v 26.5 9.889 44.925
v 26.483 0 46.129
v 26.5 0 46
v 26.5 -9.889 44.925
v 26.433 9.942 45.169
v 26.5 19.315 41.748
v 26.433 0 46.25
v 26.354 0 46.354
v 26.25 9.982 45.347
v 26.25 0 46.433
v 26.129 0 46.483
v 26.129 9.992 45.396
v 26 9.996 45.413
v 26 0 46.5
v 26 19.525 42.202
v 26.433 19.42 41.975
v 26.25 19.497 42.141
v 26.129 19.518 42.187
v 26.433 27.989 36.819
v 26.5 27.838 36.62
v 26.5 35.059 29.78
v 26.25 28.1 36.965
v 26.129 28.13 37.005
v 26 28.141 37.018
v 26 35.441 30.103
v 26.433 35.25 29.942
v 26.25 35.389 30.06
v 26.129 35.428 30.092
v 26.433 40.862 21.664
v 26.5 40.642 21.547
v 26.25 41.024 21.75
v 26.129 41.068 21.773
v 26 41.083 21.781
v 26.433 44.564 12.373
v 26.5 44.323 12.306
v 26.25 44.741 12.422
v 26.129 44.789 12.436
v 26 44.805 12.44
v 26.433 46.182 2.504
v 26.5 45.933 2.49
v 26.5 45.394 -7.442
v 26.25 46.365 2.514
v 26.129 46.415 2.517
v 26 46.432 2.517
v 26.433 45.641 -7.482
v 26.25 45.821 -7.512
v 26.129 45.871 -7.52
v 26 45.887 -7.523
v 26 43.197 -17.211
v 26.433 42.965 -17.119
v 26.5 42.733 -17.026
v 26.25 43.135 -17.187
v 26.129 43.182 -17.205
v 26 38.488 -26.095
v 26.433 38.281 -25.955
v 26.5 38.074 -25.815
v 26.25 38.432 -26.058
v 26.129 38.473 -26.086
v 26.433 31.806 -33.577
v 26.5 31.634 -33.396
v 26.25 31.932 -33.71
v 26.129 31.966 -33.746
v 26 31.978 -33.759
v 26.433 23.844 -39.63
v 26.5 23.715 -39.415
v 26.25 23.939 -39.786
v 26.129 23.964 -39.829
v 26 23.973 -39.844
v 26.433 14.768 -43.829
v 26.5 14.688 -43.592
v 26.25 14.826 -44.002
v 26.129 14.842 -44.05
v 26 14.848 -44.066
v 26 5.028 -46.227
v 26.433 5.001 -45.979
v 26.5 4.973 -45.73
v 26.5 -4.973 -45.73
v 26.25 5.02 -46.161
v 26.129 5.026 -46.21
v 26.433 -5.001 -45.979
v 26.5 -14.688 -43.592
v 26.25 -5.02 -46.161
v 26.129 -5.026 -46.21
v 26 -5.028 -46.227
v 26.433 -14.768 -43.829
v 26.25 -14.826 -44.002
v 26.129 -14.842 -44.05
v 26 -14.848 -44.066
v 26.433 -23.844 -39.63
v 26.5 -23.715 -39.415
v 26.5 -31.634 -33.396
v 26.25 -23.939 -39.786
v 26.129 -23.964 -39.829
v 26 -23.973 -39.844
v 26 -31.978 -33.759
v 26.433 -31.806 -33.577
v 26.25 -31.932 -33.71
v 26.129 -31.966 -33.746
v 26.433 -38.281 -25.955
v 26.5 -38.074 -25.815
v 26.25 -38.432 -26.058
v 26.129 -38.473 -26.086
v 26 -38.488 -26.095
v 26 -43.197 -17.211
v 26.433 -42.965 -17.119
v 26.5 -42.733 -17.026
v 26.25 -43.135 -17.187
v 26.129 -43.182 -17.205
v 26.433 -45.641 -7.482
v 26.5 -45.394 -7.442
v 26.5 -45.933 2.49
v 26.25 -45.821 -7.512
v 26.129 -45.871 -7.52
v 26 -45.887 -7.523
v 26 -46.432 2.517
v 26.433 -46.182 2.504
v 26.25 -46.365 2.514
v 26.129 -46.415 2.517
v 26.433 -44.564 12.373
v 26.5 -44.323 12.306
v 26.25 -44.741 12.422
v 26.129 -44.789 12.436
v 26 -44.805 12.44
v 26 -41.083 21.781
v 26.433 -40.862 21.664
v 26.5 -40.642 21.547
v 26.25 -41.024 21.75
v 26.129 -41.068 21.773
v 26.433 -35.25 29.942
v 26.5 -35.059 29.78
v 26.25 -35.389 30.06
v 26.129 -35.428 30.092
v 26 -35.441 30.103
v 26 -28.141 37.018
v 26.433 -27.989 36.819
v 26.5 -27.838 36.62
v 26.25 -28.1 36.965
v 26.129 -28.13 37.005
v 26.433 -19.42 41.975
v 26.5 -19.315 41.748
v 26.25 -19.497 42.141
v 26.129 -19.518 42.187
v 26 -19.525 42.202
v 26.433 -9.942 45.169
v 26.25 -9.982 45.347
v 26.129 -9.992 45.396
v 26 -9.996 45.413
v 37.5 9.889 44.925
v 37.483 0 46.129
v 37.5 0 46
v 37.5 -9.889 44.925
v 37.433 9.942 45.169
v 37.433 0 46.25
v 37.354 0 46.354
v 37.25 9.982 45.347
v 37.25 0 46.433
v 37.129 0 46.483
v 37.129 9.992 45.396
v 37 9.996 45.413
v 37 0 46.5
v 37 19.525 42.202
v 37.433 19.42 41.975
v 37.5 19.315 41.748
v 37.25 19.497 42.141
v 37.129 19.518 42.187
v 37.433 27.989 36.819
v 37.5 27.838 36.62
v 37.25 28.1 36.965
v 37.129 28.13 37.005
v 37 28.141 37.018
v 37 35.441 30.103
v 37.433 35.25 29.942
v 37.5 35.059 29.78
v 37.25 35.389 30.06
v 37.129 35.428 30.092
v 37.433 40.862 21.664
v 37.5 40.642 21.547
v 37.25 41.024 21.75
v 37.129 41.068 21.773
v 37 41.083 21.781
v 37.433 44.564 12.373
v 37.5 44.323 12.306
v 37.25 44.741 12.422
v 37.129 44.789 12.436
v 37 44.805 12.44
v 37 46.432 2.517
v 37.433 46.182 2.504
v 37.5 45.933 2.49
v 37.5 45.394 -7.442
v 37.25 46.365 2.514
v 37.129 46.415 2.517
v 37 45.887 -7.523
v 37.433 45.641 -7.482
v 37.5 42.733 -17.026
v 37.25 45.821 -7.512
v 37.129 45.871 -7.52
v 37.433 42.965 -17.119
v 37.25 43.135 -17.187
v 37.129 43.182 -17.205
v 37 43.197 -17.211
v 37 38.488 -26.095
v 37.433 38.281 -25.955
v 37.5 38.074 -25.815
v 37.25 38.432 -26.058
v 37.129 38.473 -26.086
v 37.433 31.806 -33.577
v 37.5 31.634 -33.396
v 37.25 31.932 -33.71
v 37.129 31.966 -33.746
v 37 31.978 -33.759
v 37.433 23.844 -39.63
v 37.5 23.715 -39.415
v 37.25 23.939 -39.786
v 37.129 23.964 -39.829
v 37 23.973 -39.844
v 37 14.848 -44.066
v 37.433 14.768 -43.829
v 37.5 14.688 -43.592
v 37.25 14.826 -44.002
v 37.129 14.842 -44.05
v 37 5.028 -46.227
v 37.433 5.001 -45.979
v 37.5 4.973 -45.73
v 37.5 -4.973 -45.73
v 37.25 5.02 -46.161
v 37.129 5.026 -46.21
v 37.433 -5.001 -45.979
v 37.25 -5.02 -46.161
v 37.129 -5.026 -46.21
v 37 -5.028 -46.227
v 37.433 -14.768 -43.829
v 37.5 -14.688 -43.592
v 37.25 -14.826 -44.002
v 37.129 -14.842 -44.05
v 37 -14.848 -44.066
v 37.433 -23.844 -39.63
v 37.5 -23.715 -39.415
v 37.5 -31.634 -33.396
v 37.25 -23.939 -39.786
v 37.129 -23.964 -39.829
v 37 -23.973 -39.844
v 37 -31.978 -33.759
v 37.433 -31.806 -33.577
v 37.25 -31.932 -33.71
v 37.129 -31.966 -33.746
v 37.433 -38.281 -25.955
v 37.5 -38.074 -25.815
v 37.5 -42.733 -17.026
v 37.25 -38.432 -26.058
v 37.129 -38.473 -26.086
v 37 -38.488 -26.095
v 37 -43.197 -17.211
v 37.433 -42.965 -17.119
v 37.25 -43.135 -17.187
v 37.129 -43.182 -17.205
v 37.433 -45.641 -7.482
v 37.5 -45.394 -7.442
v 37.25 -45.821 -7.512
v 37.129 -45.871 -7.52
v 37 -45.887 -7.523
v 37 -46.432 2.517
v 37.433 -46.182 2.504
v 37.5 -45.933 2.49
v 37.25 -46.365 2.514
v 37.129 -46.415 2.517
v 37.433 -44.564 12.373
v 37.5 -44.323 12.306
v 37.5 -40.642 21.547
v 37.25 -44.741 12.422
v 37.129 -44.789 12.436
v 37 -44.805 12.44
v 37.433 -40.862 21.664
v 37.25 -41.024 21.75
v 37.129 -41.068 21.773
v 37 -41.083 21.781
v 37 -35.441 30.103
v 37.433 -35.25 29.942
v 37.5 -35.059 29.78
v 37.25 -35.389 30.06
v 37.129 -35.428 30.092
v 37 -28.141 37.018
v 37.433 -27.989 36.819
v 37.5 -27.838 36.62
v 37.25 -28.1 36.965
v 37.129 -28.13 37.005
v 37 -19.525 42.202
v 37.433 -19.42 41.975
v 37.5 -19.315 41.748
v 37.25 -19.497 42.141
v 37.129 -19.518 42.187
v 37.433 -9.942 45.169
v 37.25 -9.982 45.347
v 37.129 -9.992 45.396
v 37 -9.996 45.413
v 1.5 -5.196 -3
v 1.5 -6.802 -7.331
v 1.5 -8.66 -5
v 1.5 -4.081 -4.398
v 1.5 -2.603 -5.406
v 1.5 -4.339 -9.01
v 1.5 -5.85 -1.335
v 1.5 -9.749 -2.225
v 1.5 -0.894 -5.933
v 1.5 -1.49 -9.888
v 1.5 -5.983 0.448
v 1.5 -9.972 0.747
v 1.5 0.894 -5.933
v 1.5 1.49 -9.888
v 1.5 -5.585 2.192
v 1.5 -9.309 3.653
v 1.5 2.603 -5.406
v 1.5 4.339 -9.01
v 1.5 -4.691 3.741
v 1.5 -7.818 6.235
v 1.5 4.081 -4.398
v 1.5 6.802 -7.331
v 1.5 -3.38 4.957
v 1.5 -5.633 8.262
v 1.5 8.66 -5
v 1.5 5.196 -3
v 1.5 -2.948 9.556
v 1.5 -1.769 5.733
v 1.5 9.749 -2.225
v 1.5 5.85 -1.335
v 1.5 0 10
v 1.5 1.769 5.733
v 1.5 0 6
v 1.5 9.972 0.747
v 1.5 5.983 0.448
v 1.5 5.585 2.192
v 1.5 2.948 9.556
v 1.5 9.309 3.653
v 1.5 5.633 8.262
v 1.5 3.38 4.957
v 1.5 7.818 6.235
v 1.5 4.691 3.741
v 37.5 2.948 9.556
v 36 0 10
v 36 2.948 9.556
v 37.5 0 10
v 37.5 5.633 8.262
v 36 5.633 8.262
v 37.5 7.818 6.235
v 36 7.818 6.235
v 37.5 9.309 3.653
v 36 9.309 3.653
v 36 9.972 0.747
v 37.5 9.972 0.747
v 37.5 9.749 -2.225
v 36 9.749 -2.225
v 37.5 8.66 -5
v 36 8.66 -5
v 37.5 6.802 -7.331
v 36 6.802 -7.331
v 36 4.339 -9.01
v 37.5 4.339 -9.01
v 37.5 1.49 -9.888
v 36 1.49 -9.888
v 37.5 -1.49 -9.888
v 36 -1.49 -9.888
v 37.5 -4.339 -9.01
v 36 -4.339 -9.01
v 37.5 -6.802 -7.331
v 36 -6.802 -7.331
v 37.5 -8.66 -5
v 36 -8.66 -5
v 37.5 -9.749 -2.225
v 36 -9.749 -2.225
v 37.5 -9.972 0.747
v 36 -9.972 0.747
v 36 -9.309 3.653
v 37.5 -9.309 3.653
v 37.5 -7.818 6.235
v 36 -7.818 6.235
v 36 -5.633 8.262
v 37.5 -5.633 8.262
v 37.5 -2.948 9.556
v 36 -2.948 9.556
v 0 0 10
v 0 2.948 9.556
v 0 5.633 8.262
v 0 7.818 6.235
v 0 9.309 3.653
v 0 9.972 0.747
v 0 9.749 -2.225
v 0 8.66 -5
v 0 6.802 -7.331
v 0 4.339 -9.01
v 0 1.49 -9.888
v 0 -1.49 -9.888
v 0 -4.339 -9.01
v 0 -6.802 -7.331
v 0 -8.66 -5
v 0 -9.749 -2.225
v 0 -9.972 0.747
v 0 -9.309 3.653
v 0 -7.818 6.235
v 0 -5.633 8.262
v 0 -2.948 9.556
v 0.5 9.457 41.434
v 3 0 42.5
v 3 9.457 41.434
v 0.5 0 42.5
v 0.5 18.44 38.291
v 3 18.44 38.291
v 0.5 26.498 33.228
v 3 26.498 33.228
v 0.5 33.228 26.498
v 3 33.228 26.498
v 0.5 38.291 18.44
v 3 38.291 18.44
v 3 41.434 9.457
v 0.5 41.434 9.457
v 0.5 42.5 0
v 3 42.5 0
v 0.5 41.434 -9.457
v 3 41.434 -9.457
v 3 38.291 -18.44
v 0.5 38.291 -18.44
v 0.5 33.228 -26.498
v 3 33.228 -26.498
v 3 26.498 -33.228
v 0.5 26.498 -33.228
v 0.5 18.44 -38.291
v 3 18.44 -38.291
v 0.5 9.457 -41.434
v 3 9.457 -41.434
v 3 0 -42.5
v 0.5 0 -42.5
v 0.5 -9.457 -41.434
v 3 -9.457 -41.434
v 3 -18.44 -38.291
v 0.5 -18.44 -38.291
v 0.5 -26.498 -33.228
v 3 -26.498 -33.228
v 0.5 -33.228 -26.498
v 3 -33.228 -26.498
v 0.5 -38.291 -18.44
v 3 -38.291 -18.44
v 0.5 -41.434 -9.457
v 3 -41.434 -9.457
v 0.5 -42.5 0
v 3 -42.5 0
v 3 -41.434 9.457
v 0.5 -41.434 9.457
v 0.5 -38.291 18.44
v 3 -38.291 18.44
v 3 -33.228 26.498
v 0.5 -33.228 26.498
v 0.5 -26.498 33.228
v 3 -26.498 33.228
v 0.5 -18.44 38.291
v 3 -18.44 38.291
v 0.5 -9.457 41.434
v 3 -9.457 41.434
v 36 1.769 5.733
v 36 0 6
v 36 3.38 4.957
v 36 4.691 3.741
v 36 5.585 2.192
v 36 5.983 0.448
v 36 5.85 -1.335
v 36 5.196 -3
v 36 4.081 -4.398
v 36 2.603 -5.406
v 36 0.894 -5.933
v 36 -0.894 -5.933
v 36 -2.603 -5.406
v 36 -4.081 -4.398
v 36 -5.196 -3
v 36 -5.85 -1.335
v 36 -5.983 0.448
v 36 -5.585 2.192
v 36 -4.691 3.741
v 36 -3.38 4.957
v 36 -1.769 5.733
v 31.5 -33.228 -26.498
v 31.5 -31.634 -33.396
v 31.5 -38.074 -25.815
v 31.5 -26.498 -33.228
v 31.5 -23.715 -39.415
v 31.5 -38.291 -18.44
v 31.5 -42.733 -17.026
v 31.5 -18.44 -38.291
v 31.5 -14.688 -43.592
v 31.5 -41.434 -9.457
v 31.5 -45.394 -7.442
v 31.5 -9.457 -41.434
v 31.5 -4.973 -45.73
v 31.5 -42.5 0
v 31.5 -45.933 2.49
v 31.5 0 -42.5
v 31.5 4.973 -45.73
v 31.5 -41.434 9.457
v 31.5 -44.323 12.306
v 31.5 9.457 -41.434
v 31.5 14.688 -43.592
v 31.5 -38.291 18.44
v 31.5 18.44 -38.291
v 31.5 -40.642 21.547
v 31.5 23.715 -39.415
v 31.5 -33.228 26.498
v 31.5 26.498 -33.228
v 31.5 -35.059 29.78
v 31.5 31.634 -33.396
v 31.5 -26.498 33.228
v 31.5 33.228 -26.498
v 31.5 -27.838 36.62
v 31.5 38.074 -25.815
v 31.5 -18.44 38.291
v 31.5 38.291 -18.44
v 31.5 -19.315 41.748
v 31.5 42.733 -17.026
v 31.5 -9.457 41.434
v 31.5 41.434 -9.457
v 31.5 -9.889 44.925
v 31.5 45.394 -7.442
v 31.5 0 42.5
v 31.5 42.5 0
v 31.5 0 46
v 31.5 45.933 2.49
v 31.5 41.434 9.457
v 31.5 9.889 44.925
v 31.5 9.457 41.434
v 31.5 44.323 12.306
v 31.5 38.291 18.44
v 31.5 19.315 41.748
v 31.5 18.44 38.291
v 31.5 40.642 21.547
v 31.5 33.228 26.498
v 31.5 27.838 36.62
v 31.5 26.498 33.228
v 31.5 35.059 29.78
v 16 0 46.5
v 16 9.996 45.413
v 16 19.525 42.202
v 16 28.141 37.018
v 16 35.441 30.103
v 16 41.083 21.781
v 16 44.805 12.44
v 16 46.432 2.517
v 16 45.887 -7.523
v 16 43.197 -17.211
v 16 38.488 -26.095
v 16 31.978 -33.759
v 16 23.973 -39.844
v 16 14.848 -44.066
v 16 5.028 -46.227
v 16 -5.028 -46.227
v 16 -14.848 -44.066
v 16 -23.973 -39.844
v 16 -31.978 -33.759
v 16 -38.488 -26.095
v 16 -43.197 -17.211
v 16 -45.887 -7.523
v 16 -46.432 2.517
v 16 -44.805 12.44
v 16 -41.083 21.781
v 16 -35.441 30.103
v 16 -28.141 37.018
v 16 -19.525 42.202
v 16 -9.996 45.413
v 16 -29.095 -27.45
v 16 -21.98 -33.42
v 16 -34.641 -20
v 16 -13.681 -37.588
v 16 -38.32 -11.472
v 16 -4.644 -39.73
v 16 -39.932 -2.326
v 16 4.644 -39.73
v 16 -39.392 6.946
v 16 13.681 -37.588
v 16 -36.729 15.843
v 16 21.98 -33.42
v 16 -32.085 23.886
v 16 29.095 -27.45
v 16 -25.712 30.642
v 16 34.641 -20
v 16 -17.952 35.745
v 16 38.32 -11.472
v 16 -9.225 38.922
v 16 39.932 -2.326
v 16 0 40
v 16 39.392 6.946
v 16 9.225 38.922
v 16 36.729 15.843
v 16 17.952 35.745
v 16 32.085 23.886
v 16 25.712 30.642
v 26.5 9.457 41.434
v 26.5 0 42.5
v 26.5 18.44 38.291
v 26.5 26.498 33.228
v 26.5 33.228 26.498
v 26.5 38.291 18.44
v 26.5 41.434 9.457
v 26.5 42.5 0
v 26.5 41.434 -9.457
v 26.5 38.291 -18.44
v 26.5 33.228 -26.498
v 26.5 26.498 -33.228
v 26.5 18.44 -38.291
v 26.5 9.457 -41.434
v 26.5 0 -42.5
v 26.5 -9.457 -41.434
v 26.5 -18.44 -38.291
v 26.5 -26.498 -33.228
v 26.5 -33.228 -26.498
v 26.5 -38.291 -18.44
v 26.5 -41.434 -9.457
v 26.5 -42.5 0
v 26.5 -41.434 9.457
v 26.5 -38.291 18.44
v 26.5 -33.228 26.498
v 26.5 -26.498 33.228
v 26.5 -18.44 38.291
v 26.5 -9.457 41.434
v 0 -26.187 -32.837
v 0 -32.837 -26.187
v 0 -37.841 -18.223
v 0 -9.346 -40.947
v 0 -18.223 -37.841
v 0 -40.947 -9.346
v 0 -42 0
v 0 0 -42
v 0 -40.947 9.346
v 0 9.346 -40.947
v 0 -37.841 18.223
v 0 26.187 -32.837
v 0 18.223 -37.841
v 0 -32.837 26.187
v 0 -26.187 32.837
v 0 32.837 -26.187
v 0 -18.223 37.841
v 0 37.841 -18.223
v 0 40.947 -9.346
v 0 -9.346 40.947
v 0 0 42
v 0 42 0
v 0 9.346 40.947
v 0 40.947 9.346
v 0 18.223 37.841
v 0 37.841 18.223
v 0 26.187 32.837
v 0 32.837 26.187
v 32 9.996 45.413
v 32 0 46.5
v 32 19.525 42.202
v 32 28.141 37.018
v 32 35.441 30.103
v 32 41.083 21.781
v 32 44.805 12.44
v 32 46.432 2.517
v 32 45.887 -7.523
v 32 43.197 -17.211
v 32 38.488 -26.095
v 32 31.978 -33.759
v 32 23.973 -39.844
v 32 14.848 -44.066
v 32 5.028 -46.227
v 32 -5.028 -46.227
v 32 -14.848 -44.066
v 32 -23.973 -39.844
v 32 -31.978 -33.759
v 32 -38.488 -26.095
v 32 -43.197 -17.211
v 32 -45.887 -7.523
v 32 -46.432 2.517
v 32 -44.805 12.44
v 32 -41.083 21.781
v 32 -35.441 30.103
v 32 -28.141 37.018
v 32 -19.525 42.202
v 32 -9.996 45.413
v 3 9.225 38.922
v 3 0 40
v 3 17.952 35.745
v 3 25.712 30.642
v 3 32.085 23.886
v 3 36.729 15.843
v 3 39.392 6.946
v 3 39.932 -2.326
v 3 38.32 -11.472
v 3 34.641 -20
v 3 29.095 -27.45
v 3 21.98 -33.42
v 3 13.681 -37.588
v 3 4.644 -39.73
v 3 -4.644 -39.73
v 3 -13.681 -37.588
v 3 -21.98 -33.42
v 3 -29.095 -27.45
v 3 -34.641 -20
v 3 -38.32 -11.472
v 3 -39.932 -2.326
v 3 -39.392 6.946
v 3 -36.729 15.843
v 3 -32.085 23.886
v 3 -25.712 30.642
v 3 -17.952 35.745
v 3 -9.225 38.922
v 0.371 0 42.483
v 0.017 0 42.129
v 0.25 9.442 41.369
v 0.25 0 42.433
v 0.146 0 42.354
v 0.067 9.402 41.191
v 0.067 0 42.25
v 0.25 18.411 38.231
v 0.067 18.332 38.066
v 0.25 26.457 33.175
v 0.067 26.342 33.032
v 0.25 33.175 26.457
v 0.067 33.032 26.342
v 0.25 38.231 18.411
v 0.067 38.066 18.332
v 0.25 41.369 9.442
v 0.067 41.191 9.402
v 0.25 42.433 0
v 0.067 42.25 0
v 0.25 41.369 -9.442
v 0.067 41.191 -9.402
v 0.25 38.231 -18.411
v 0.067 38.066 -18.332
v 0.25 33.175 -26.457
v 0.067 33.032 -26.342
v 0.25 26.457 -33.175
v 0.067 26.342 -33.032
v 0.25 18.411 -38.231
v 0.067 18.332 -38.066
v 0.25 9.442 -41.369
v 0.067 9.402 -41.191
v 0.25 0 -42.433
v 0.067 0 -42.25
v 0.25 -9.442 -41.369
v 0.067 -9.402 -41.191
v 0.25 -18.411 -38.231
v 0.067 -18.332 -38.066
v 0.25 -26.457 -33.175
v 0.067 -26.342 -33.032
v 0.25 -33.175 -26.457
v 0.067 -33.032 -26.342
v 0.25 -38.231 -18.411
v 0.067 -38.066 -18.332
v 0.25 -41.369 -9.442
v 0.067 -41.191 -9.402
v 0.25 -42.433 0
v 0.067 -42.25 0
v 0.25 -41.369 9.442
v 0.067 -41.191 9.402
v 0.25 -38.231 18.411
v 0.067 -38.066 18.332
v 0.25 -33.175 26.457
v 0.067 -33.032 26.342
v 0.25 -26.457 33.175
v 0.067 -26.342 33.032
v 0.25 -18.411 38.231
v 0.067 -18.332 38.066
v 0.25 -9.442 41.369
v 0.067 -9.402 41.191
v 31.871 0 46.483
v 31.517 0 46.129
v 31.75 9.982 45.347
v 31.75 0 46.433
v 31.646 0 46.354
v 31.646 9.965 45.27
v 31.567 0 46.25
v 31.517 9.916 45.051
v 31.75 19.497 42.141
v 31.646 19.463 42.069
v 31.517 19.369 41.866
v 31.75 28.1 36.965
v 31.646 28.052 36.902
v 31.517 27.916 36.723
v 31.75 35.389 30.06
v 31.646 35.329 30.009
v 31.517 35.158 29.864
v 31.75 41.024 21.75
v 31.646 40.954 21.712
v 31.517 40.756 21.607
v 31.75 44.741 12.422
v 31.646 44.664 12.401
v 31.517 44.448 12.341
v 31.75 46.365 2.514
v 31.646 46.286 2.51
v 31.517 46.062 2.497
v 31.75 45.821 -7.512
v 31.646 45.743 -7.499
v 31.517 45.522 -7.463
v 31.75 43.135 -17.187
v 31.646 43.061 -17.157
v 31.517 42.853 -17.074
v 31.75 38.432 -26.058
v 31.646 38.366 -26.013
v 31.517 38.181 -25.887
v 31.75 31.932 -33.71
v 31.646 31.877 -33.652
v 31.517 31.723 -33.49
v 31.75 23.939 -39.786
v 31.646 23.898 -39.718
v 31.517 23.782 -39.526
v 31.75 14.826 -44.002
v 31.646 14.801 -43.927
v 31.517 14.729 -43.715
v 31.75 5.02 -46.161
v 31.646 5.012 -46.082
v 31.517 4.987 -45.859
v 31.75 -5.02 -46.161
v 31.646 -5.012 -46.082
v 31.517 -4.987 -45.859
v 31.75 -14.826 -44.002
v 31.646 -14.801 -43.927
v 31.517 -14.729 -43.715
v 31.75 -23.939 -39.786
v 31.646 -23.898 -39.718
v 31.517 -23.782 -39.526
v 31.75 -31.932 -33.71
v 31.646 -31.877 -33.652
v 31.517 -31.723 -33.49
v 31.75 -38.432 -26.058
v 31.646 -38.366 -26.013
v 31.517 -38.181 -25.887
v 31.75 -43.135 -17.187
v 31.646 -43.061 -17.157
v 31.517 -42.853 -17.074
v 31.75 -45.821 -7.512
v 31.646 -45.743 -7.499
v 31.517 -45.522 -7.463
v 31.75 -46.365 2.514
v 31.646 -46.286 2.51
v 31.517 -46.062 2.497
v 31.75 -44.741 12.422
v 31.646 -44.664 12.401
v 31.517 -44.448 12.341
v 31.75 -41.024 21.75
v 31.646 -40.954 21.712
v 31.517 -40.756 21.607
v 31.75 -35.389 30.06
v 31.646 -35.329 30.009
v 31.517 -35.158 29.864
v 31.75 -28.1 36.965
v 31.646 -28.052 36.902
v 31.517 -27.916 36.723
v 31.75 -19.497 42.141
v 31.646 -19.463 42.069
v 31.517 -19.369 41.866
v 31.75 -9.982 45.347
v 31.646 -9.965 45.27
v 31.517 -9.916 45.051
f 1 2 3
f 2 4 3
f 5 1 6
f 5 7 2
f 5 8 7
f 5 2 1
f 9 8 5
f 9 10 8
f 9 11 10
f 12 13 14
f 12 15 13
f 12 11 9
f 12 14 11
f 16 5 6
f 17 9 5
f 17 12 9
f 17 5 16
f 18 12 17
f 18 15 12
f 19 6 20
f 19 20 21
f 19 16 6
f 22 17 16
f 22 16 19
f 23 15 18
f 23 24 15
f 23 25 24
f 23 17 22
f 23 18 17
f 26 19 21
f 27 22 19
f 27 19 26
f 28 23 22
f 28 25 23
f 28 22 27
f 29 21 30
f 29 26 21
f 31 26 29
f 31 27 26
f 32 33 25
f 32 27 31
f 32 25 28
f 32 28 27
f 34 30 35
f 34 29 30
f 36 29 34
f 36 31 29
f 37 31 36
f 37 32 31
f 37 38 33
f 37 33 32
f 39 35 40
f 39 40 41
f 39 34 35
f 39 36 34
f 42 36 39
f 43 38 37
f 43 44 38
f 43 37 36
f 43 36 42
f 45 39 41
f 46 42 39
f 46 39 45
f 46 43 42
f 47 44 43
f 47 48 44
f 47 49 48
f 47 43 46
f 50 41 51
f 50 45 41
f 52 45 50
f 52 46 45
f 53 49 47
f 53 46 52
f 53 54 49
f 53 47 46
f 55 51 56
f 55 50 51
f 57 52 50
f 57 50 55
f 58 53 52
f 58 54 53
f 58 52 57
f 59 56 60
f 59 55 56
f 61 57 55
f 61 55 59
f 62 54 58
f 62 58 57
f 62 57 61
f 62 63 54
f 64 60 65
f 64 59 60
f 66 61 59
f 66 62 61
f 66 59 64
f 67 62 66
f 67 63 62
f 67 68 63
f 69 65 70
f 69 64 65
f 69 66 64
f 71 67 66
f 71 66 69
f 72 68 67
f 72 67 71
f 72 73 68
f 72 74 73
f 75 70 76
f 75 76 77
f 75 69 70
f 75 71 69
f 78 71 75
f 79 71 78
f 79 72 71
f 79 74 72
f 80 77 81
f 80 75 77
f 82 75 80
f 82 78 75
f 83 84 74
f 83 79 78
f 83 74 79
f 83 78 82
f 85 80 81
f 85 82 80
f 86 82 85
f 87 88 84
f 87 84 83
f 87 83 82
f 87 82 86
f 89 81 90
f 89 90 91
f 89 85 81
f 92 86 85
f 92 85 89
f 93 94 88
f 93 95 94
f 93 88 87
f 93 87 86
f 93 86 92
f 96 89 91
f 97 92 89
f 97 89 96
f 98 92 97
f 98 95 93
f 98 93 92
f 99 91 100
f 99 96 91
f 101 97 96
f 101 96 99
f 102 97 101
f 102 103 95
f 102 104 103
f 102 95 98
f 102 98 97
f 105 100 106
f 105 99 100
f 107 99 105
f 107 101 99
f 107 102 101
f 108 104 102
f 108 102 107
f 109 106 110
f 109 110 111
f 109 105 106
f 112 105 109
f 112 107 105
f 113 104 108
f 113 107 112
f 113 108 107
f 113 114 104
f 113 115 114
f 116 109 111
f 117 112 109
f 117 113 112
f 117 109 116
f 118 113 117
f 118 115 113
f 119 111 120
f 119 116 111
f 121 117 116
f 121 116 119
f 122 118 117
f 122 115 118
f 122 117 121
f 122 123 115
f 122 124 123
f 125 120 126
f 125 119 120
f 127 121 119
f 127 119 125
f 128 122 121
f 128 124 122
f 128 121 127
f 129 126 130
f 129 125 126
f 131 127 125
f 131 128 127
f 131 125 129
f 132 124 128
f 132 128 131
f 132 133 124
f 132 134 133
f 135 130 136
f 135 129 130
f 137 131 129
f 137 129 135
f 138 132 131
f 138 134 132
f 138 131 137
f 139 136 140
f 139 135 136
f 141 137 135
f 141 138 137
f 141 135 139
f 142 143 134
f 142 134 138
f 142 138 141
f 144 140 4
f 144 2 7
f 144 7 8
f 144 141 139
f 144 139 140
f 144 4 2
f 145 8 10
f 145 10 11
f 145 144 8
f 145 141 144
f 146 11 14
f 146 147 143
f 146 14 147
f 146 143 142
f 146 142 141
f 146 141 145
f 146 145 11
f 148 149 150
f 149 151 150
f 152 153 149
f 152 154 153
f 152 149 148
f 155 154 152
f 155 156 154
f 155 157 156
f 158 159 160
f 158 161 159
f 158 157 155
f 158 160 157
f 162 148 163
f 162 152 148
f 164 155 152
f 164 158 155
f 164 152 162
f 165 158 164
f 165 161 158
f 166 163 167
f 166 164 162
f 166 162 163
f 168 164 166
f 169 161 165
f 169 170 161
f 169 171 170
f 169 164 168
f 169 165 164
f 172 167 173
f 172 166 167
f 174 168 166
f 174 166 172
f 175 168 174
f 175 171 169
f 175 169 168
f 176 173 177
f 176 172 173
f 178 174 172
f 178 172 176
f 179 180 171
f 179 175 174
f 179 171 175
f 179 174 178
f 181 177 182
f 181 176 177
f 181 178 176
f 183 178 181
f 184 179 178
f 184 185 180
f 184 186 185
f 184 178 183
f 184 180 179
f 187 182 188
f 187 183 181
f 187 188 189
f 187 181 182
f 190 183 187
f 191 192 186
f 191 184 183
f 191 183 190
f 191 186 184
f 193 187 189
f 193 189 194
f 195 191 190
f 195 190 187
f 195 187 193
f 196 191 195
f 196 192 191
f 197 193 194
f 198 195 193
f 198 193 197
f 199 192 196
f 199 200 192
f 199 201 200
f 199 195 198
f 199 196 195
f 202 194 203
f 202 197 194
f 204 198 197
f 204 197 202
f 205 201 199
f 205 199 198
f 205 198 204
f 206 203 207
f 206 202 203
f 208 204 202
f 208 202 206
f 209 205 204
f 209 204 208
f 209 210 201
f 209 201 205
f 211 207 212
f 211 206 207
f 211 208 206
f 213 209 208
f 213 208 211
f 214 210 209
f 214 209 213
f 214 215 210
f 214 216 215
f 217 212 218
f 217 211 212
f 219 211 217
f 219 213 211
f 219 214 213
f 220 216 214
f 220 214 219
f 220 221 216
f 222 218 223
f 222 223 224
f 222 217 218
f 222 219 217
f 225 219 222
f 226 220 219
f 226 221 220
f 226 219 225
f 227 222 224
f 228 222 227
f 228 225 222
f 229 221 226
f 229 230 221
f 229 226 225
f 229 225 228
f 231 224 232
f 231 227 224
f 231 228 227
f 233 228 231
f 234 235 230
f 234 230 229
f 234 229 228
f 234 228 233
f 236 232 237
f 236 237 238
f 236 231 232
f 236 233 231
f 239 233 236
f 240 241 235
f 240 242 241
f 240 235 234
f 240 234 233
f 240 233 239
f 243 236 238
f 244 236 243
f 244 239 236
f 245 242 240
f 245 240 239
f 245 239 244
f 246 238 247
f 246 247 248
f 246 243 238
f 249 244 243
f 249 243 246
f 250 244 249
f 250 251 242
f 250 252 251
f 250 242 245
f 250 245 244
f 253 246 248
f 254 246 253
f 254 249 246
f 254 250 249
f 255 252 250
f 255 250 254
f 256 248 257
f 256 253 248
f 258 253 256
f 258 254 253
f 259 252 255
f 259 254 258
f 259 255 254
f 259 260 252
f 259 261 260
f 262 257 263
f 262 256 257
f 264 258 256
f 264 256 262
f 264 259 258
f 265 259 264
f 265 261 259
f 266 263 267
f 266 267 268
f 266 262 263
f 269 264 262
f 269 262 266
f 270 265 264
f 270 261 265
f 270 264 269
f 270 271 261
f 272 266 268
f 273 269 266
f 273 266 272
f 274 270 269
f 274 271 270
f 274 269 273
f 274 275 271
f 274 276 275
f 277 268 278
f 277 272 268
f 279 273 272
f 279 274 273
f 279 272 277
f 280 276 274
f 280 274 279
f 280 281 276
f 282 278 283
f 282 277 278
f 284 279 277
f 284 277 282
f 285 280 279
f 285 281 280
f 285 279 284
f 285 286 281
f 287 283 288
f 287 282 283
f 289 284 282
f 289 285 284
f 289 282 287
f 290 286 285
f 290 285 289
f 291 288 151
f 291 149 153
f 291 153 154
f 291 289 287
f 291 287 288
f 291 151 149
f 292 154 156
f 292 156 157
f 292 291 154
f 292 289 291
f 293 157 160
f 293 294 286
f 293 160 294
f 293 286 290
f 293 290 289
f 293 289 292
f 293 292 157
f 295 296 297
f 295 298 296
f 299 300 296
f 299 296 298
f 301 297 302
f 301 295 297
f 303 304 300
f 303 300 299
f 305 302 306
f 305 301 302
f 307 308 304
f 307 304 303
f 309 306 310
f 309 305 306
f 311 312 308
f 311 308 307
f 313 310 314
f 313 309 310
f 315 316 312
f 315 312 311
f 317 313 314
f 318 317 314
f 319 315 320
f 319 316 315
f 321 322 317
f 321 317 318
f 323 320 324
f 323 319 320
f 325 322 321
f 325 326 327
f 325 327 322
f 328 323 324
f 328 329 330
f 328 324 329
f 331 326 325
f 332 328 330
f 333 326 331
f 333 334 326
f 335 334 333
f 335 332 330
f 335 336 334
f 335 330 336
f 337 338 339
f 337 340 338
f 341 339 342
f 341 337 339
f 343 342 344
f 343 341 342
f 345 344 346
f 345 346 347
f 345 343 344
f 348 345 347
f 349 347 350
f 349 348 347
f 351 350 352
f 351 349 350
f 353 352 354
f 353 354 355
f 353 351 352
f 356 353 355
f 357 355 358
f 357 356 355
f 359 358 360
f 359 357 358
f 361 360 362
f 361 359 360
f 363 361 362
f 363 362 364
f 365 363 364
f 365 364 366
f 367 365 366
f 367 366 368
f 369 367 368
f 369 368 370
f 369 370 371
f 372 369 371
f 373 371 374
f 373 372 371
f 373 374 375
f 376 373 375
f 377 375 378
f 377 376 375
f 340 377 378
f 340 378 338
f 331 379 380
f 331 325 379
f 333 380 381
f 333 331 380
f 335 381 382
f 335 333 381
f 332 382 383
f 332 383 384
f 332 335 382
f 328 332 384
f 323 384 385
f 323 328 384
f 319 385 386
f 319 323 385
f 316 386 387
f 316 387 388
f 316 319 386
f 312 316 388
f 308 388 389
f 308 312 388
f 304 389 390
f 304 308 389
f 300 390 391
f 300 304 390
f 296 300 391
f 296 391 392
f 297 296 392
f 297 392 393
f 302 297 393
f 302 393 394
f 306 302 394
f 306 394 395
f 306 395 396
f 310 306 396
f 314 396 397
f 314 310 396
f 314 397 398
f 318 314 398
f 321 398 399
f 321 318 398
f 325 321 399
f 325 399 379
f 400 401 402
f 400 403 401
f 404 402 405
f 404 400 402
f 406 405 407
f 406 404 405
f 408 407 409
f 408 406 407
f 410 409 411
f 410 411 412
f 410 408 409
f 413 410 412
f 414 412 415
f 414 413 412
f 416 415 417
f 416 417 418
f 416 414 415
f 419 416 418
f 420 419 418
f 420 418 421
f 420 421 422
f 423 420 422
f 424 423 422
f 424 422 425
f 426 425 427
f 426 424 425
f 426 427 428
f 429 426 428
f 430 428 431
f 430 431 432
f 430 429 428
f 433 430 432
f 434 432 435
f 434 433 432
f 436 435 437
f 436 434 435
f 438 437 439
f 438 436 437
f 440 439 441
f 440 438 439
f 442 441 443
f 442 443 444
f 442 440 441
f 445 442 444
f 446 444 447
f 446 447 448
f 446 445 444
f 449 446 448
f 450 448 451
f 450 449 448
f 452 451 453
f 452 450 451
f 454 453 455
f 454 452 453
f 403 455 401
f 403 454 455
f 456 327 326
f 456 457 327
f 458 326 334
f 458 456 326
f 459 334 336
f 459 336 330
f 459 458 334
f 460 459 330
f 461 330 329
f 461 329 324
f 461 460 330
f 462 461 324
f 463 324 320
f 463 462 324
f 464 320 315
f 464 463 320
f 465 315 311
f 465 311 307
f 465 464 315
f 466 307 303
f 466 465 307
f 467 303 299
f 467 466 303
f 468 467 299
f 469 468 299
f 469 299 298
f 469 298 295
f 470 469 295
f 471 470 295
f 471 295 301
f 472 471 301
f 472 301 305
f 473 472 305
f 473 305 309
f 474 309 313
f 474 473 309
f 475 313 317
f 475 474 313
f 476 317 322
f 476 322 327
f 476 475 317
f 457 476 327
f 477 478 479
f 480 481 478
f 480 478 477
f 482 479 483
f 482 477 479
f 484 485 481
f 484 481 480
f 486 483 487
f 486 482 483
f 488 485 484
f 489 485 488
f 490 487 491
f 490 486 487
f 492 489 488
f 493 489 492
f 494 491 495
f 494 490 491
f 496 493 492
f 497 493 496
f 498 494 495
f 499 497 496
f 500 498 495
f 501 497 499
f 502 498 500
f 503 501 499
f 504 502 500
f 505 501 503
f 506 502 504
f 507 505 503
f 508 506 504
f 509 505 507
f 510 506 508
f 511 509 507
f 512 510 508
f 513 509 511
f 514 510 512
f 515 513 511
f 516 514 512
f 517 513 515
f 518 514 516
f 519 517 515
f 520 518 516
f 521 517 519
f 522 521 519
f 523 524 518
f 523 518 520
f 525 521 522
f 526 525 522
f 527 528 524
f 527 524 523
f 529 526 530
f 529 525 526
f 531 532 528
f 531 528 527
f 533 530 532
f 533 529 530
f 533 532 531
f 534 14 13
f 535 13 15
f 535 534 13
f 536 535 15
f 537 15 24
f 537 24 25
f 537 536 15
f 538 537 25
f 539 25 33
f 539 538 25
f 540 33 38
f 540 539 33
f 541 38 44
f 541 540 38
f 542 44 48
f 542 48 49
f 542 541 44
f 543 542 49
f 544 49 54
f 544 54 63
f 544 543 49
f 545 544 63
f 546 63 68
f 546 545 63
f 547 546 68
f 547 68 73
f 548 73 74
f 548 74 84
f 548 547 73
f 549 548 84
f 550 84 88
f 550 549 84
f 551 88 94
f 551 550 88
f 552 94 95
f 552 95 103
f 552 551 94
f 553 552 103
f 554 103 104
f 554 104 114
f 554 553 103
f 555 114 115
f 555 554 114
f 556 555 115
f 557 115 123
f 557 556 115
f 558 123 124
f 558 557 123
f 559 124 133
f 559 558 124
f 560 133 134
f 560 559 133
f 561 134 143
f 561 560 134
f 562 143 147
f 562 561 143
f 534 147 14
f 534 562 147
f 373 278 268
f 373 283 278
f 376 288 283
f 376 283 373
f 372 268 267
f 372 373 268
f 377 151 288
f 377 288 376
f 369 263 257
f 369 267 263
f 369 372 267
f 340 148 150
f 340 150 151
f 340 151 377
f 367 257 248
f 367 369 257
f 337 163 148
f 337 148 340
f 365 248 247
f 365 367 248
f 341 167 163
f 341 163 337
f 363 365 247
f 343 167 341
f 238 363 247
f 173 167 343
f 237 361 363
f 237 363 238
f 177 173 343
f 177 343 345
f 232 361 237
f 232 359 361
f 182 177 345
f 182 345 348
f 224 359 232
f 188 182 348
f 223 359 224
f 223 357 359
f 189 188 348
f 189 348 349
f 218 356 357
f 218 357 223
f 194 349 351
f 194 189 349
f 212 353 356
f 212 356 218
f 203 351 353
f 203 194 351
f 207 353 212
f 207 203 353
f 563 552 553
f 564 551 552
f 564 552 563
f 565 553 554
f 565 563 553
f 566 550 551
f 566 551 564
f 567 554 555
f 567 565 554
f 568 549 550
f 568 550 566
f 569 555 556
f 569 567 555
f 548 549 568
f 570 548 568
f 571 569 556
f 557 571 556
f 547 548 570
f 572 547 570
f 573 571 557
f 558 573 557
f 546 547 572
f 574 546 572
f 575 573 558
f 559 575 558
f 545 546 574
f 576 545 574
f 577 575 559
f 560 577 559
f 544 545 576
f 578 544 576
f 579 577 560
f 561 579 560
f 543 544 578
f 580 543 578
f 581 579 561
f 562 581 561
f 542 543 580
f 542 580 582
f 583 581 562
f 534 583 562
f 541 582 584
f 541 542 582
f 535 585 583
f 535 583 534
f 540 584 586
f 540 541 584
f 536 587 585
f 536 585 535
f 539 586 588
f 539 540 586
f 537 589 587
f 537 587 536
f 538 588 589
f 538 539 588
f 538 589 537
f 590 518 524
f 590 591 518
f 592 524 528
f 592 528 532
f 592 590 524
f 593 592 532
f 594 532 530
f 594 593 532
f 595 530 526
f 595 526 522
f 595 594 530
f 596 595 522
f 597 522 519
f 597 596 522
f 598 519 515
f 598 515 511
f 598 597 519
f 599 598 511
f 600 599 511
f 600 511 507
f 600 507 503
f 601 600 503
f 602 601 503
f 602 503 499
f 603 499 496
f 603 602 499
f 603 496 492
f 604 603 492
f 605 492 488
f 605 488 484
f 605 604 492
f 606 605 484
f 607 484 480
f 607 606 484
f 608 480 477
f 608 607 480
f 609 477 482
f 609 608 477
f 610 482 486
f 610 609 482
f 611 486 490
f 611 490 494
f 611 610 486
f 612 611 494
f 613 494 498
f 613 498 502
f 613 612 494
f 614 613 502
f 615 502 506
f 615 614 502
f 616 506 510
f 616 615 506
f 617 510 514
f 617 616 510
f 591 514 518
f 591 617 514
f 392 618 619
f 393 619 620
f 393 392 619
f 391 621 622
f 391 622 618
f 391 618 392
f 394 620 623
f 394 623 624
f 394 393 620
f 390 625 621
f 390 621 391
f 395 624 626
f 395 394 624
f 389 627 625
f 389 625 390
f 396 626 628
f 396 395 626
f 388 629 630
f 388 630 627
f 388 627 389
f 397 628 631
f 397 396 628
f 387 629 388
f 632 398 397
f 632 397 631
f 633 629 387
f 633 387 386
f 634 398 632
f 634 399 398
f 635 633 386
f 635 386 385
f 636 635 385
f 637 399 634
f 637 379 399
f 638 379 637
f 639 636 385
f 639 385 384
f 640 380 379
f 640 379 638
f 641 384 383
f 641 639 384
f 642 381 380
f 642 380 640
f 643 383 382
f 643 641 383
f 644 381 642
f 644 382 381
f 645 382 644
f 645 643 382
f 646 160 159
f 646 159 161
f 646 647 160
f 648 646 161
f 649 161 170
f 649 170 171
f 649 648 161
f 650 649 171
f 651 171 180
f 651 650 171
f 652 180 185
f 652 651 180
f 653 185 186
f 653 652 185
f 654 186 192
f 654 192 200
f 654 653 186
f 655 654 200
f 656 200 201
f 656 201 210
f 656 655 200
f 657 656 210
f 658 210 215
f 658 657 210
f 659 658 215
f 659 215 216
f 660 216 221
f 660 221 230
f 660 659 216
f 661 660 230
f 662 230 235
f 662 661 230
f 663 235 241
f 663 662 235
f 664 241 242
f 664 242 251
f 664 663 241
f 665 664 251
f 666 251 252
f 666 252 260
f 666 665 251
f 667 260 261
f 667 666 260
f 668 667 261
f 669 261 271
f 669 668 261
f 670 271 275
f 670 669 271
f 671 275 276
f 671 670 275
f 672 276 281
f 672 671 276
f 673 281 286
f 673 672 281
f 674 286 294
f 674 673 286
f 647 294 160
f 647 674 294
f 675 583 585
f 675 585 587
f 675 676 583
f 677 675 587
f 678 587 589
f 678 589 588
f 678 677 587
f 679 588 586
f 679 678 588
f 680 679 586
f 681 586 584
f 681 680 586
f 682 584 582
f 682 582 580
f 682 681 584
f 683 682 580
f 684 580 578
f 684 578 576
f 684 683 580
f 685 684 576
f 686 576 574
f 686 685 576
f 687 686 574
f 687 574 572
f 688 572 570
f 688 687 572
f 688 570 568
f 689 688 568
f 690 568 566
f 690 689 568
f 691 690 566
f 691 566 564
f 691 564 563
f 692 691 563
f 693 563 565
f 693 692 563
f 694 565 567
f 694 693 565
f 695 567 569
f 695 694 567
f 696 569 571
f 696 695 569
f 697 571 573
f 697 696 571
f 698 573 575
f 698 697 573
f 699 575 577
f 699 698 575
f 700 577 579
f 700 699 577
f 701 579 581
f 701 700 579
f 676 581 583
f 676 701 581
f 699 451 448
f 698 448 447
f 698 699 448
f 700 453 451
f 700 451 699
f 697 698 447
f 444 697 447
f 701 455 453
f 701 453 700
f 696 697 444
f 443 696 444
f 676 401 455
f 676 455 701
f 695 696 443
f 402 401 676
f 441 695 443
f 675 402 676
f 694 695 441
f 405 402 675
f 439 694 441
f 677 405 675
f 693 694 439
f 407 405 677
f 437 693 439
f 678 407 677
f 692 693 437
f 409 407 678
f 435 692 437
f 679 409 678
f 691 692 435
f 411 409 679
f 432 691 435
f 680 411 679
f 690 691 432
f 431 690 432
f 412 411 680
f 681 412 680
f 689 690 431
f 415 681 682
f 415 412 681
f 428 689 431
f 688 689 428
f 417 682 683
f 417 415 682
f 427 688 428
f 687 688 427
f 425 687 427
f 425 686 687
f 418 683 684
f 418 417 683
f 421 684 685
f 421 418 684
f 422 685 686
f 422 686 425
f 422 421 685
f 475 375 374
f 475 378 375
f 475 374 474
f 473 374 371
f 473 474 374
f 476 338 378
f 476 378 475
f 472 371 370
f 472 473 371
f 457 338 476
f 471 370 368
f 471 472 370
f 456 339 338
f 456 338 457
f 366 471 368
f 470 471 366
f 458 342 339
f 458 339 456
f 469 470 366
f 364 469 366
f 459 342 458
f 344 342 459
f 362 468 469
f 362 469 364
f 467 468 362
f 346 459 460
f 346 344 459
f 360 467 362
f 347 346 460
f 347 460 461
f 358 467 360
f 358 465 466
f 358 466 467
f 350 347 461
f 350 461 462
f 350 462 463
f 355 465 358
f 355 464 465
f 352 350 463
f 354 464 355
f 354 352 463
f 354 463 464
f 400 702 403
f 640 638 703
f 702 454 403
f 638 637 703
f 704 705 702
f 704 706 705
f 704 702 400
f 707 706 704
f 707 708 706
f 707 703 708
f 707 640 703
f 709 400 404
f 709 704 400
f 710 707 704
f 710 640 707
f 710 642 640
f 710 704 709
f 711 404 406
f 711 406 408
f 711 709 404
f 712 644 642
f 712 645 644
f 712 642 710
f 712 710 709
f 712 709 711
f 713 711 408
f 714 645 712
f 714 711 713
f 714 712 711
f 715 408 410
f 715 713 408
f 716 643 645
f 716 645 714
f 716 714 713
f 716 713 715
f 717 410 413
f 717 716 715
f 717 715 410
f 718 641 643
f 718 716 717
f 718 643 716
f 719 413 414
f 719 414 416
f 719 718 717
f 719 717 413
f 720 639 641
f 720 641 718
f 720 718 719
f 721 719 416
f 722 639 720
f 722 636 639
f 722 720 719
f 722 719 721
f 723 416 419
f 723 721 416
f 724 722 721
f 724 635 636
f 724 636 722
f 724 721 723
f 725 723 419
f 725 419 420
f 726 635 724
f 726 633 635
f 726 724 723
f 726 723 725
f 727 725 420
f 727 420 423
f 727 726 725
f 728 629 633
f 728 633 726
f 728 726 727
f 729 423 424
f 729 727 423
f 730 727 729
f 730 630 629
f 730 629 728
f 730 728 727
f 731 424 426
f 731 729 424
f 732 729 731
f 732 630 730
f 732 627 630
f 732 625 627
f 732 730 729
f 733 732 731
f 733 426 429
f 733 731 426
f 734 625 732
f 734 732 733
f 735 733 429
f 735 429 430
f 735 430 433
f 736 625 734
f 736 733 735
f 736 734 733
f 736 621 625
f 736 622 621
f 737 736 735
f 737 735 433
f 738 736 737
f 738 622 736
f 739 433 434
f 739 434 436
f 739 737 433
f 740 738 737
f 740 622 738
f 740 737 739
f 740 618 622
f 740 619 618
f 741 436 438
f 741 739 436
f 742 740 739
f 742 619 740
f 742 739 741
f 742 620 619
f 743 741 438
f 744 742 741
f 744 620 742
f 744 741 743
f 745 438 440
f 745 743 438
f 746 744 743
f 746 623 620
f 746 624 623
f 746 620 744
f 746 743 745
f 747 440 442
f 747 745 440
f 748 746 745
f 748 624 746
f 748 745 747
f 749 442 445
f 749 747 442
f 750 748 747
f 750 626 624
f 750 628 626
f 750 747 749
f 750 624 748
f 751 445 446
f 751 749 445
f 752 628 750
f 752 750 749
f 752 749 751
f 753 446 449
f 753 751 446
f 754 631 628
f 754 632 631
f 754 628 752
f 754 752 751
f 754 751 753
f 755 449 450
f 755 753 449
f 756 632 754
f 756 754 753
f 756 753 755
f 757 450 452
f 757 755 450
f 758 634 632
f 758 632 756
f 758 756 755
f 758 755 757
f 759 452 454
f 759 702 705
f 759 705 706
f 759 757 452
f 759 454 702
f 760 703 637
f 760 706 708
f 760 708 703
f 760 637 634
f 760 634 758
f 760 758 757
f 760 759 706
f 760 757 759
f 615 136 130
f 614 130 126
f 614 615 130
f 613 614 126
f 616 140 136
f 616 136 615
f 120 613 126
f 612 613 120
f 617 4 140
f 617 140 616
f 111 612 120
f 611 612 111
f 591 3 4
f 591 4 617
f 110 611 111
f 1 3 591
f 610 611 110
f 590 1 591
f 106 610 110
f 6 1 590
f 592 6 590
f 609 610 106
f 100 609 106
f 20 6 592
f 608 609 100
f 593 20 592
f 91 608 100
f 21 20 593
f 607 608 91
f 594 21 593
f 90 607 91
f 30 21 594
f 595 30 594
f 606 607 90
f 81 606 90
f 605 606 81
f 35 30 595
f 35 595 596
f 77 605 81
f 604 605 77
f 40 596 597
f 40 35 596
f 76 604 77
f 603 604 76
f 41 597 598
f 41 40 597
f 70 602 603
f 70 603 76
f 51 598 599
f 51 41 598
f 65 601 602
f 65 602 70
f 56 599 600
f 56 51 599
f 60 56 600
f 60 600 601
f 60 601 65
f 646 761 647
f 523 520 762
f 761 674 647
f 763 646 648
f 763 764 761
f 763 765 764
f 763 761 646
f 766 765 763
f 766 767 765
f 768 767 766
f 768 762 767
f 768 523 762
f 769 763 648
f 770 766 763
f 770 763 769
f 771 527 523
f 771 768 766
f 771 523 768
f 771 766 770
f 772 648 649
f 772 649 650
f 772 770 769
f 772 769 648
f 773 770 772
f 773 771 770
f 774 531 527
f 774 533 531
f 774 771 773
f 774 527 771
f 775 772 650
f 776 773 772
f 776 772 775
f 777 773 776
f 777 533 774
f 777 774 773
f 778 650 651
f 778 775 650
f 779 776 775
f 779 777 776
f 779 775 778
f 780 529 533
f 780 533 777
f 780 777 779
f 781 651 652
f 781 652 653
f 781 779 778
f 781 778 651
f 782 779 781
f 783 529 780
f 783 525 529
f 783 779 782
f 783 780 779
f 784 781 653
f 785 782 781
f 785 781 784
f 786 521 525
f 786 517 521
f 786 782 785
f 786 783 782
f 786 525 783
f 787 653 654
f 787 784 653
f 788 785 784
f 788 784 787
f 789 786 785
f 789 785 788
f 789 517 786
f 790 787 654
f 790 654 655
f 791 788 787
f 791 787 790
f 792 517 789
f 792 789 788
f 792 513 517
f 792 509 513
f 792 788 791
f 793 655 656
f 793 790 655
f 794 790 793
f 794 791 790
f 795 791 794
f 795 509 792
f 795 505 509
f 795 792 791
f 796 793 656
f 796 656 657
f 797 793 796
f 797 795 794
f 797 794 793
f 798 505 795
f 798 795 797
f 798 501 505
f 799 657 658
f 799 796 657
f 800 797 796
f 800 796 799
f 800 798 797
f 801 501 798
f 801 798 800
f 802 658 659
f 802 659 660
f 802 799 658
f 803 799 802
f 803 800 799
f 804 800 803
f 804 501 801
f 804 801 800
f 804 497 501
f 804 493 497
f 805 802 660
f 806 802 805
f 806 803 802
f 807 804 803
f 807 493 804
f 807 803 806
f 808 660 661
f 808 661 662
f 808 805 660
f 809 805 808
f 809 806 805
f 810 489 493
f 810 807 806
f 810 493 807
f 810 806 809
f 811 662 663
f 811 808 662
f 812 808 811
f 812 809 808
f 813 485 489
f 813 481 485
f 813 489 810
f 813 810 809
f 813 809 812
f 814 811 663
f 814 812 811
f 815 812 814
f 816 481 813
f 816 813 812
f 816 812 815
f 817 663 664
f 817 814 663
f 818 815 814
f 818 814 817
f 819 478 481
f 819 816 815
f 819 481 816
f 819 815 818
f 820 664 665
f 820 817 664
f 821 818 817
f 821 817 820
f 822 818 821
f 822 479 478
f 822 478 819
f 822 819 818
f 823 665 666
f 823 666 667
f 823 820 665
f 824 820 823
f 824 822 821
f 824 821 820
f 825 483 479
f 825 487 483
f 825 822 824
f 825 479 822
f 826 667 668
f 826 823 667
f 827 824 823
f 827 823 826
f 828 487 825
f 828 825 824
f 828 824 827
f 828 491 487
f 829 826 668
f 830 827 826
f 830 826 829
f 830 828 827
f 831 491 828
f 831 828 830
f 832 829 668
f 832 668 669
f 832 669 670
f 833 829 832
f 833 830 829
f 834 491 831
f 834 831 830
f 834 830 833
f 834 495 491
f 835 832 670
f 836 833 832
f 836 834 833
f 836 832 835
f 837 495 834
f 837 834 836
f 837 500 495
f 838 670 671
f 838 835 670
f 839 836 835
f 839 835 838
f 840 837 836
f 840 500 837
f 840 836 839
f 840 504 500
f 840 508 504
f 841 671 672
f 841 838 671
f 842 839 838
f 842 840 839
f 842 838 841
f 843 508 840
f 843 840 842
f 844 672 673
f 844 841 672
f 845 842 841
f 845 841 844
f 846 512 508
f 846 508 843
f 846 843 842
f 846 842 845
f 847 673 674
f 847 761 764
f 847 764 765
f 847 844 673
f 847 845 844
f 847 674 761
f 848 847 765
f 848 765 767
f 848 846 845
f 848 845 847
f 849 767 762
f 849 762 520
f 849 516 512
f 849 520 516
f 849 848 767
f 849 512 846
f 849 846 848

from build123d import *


with BuildPart() as f1:
    # F0 (on Front) → F1 (revolve)
    with BuildSketch(Plane.XZ):
        with BuildLine():
            Line((0, 42), (0, 10))
            Line((0, 10), (1.5, 10))
            Line((1.5, 10), (1.5, 6))
            Line((1.5, 6), (36, 6))
            Line((36, 6), (36, 10))
            Line((36, 10), (37.5, 10))
            Line((37.5, 10), (37.5, 46))
            ThreePointArc((37.5, 46), (37.3535533906, 46.3535533906), (37, 46.5))
            Line((37, 46.5), (32, 46.5))
            ThreePointArc((32, 46.5), (31.6464466094, 46.3535533906), (31.5, 46))
            Line((31.5, 46), (31.5, 42.5))
            Line((31.5, 42.5), (26.5, 42.5))
            Line((26.5, 42.5), (26.5, 46))
            ThreePointArc((26.5, 46), (26.3535533906, 46.3535533906), (26, 46.5))
            Line((26, 46.5), (16, 46.5))
            Line((16, 46.5), (16, 40))
            Line((16, 40), (3, 40))
            Line((3, 40), (3, 42.5))
            Line((3, 42.5), (0.5, 42.5))
            ThreePointArc((0.5, 42.5), (0.1464466094, 42.3535533906), (0, 42))
        make_face()
    revolve(axis=Axis((18.75, 0, 0), (-1, 0, 0)))


solid = f1.part
